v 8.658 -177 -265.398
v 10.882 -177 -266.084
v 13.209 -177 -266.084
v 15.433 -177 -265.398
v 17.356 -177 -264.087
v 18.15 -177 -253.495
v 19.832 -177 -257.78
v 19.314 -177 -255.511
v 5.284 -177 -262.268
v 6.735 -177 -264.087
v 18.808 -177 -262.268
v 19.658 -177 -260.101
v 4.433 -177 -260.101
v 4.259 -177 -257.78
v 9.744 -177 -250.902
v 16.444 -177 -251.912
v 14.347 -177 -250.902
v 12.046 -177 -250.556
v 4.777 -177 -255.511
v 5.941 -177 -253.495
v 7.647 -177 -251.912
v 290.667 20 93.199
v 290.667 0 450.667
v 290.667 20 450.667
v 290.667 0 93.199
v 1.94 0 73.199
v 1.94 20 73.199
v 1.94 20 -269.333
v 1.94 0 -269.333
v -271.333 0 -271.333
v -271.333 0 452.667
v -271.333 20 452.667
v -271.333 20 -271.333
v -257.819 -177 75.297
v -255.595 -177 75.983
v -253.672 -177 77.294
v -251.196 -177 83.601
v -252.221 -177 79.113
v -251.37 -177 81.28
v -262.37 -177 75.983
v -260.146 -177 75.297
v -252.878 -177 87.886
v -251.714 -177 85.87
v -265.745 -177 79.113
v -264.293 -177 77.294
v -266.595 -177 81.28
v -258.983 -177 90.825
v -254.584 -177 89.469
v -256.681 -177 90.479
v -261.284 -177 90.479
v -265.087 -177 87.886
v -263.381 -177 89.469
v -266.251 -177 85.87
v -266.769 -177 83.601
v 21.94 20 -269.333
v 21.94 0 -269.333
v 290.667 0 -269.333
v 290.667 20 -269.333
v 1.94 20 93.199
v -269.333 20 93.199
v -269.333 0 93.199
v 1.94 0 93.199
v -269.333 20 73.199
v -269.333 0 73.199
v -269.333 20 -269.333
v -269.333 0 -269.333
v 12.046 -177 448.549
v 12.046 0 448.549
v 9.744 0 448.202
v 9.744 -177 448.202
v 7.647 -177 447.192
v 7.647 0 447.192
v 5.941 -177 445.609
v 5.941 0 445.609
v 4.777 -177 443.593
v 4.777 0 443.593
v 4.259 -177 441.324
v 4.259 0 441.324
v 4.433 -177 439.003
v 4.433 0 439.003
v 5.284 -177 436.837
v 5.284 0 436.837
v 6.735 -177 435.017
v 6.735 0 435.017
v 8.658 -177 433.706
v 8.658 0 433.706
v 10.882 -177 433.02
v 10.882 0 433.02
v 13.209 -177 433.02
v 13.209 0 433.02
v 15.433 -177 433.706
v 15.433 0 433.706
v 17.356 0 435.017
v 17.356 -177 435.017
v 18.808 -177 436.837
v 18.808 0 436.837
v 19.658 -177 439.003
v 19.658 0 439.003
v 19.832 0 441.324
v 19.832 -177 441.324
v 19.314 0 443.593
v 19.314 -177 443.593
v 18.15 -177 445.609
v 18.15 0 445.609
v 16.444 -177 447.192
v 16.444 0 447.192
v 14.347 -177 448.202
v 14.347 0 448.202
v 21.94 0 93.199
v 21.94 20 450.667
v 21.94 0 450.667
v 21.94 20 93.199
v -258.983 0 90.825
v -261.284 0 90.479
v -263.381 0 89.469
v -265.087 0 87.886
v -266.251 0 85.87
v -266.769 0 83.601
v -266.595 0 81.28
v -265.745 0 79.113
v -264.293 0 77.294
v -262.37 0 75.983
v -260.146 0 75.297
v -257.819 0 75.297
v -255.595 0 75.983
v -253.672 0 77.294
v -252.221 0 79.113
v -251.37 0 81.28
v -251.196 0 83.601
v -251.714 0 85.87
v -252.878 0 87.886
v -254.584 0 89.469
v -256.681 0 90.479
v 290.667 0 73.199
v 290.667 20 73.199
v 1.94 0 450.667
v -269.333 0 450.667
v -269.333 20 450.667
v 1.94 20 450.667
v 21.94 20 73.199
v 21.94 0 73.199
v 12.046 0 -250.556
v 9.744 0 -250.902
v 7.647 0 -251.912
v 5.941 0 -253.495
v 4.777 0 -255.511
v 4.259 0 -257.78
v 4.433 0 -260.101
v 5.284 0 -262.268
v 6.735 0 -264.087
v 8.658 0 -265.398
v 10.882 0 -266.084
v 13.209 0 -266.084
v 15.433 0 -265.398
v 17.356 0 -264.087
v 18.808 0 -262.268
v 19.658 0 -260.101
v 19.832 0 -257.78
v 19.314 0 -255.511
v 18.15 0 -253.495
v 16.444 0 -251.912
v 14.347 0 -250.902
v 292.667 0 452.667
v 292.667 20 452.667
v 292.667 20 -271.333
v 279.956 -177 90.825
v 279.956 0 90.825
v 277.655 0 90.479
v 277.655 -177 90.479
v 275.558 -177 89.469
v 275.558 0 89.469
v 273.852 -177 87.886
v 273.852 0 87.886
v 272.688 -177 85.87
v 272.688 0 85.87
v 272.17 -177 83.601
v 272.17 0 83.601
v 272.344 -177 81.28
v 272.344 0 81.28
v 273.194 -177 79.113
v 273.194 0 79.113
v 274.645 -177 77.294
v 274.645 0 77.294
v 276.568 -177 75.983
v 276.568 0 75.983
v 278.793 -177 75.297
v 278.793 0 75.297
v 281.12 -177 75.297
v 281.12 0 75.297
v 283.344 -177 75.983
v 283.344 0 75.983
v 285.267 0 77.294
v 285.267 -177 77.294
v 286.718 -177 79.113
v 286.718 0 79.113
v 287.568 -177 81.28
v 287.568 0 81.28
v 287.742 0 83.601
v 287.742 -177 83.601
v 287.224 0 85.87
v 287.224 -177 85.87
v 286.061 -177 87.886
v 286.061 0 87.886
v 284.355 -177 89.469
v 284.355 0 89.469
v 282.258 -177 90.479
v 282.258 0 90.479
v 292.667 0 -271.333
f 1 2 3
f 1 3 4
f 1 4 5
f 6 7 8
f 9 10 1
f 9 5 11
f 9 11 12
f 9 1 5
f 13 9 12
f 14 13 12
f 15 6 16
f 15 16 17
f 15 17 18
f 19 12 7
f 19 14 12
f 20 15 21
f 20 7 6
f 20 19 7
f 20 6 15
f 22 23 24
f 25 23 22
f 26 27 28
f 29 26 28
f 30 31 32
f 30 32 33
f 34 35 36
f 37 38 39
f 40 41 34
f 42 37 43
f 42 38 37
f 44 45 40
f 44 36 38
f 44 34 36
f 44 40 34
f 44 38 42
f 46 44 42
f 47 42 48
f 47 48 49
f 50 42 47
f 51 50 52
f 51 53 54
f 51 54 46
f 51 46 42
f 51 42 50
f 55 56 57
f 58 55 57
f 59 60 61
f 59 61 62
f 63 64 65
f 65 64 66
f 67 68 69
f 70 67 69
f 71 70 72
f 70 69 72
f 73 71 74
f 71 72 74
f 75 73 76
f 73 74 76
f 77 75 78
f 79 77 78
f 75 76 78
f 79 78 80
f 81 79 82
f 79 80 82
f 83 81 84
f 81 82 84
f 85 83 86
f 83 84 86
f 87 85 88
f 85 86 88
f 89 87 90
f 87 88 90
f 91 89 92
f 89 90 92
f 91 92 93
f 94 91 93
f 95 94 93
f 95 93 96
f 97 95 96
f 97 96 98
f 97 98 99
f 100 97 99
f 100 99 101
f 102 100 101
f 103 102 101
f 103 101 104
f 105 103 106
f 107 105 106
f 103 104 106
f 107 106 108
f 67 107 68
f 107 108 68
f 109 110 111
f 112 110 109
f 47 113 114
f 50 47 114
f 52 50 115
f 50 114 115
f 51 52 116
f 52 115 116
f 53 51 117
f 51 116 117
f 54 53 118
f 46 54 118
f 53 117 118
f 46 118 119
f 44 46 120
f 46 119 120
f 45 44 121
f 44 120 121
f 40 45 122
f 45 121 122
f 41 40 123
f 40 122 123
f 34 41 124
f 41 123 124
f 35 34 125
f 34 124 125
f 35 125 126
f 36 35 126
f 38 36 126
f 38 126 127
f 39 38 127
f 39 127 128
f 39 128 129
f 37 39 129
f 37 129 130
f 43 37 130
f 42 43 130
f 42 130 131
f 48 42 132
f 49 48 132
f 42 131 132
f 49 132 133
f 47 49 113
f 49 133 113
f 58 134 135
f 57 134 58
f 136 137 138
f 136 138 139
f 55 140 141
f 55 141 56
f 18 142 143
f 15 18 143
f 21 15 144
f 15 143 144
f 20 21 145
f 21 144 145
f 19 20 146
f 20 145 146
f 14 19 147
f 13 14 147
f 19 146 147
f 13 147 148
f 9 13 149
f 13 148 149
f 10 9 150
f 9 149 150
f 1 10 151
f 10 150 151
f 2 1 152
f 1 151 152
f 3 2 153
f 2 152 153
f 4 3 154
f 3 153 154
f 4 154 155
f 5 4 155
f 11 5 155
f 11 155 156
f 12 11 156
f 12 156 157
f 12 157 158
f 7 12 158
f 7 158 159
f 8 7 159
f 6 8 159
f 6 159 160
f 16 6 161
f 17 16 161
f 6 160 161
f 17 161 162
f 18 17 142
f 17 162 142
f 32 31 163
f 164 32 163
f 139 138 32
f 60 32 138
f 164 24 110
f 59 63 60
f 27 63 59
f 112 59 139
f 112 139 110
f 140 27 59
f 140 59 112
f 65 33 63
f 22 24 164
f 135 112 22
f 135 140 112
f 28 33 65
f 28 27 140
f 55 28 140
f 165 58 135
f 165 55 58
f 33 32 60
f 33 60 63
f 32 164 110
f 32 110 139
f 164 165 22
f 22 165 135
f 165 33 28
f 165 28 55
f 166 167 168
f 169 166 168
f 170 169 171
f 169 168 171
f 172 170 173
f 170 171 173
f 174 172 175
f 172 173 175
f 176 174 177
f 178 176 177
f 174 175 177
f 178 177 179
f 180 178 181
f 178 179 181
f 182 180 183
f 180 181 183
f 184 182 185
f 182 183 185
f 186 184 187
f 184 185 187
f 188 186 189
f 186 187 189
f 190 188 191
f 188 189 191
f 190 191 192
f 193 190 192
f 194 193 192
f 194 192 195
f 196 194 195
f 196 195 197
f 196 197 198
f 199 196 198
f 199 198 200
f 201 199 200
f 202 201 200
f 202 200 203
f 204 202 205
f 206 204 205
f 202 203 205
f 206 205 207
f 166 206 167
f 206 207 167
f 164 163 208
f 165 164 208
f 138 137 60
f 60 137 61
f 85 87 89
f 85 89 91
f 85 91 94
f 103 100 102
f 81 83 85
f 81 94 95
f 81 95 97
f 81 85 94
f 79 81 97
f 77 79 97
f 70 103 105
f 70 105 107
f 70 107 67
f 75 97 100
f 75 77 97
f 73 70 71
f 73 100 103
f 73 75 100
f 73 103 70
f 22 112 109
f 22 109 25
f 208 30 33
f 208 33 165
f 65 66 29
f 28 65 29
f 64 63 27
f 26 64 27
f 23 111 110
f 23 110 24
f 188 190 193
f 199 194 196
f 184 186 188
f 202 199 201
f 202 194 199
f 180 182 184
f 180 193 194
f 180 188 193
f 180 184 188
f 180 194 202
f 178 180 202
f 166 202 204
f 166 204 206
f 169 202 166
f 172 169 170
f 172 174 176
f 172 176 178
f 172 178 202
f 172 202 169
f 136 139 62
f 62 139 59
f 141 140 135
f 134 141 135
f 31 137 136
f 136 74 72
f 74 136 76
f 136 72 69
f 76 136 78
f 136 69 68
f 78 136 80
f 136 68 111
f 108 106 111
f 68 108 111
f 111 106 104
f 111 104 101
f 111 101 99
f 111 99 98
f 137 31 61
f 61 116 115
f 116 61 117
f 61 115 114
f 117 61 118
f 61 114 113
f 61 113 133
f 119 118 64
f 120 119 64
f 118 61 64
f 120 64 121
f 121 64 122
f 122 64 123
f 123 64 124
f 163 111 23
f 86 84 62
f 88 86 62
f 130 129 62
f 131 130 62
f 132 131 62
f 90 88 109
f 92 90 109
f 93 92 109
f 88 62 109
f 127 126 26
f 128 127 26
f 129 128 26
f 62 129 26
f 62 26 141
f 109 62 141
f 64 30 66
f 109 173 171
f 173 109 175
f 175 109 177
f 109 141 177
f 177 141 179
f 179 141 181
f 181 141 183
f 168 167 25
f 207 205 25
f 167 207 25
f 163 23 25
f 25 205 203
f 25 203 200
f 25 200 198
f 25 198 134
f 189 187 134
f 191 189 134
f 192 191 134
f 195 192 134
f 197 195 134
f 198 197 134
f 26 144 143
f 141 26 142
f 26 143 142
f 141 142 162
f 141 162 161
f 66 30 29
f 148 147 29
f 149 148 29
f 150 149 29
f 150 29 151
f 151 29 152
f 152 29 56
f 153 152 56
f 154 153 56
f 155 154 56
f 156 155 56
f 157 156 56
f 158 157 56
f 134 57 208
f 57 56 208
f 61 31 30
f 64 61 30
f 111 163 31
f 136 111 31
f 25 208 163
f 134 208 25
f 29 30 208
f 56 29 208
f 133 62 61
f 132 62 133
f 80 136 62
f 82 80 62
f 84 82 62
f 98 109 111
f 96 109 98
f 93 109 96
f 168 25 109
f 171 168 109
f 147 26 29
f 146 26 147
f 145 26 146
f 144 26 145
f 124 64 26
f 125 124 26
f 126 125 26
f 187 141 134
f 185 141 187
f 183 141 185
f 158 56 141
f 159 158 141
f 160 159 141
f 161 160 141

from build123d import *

# Parameters (mm, degrees)
CROQUIS1_W              = 564
CROQUIS1_H              = 724
CROQUIS1_W_2            = 560
CROQUIS1_H_2            = 720
SALIENTE_EXTRUIR1_DEPTH = 20
CROQUIS2_W              = 20
CROQUIS2_H              = 357.467498219
CROQUIS2_W_2            = 271.273547015
CROQUIS2_H_2            = 20
CROQUIS2_W_3            = 268.726452985
CROQUIS2_H_3            = 342.532501781
SALIENTE_EXTRUIR4_DEPTH = 20
CROQUIS4_R              = 7.807995064
SALIENTE_EXTRUIR5_DEPTH = 177


with BuildPart() as part:
    # Croquis1 → Saliente-Extruir1 (new body)
    with BuildSketch(Plane(origin=(0, 0, 0), x_dir=(1, 0, 0), z_dir=(0, 1, 0))):
        with Locations((10.666666667, -90.666666667)):
            Rectangle(CROQUIS1_W, CROQUIS1_H)
        with Locations((10.666666667, -90.666666667)):
            Rectangle(CROQUIS1_W_2, CROQUIS1_H_2, mode=Mode.SUBTRACT)
    extrude(amount=SALIENTE_EXTRUIR1_DEPTH)

    # Croquis2 → Saliente-Extruir4 (add)
    with BuildSketch(Plane(origin=(0, 20, 0), x_dir=(1, 0, 0), z_dir=(0, 1, 0))):
        with Locations((11.940213682, -271.932917557)):
            Rectangle(CROQUIS2_W, CROQUIS2_H)
        with Locations((-133.696559826, -83.199168448)):
            Rectangle(CROQUIS2_W_2, CROQUIS2_H_2)
        with Locations((156.303440174, -83.199168448)):
            Rectangle(CROQUIS2_W_3, CROQUIS2_H_2)
        with Locations((11.940213682, 98.067082443)):
            Rectangle(CROQUIS2_W, CROQUIS2_H_3)
        with Locations((11.940213682, -83.199168448)):
            Rectangle(CROQUIS2_W, CROQUIS2_H_2)
    extrude(amount=-SALIENTE_EXTRUIR4_DEPTH)

    # Croquis4 → Saliente-Extruir5 (add)
    with BuildSketch(Plane.XZ):
        with Locations(Location((279.95622774, 83.01742746, 0), (0, 0, 90))):
            Circle(CROQUIS4_R)
        with Locations(Location((12.04565938, 440.740646454, 0), (0, 0, 90))):
            Circle(CROQUIS4_R)
        with Locations(Location((12.04565938, -258.363567648, 0), (0, 0, 90))):
            Circle(CROQUIS4_R)
        with Locations(Location((-258.982651015, 83.01742746, 0), (0, 0, 90))):
            Circle(CROQUIS4_R)
    extrude(amount=SALIENTE_EXTRUIR5_DEPTH)


solid = part.part
